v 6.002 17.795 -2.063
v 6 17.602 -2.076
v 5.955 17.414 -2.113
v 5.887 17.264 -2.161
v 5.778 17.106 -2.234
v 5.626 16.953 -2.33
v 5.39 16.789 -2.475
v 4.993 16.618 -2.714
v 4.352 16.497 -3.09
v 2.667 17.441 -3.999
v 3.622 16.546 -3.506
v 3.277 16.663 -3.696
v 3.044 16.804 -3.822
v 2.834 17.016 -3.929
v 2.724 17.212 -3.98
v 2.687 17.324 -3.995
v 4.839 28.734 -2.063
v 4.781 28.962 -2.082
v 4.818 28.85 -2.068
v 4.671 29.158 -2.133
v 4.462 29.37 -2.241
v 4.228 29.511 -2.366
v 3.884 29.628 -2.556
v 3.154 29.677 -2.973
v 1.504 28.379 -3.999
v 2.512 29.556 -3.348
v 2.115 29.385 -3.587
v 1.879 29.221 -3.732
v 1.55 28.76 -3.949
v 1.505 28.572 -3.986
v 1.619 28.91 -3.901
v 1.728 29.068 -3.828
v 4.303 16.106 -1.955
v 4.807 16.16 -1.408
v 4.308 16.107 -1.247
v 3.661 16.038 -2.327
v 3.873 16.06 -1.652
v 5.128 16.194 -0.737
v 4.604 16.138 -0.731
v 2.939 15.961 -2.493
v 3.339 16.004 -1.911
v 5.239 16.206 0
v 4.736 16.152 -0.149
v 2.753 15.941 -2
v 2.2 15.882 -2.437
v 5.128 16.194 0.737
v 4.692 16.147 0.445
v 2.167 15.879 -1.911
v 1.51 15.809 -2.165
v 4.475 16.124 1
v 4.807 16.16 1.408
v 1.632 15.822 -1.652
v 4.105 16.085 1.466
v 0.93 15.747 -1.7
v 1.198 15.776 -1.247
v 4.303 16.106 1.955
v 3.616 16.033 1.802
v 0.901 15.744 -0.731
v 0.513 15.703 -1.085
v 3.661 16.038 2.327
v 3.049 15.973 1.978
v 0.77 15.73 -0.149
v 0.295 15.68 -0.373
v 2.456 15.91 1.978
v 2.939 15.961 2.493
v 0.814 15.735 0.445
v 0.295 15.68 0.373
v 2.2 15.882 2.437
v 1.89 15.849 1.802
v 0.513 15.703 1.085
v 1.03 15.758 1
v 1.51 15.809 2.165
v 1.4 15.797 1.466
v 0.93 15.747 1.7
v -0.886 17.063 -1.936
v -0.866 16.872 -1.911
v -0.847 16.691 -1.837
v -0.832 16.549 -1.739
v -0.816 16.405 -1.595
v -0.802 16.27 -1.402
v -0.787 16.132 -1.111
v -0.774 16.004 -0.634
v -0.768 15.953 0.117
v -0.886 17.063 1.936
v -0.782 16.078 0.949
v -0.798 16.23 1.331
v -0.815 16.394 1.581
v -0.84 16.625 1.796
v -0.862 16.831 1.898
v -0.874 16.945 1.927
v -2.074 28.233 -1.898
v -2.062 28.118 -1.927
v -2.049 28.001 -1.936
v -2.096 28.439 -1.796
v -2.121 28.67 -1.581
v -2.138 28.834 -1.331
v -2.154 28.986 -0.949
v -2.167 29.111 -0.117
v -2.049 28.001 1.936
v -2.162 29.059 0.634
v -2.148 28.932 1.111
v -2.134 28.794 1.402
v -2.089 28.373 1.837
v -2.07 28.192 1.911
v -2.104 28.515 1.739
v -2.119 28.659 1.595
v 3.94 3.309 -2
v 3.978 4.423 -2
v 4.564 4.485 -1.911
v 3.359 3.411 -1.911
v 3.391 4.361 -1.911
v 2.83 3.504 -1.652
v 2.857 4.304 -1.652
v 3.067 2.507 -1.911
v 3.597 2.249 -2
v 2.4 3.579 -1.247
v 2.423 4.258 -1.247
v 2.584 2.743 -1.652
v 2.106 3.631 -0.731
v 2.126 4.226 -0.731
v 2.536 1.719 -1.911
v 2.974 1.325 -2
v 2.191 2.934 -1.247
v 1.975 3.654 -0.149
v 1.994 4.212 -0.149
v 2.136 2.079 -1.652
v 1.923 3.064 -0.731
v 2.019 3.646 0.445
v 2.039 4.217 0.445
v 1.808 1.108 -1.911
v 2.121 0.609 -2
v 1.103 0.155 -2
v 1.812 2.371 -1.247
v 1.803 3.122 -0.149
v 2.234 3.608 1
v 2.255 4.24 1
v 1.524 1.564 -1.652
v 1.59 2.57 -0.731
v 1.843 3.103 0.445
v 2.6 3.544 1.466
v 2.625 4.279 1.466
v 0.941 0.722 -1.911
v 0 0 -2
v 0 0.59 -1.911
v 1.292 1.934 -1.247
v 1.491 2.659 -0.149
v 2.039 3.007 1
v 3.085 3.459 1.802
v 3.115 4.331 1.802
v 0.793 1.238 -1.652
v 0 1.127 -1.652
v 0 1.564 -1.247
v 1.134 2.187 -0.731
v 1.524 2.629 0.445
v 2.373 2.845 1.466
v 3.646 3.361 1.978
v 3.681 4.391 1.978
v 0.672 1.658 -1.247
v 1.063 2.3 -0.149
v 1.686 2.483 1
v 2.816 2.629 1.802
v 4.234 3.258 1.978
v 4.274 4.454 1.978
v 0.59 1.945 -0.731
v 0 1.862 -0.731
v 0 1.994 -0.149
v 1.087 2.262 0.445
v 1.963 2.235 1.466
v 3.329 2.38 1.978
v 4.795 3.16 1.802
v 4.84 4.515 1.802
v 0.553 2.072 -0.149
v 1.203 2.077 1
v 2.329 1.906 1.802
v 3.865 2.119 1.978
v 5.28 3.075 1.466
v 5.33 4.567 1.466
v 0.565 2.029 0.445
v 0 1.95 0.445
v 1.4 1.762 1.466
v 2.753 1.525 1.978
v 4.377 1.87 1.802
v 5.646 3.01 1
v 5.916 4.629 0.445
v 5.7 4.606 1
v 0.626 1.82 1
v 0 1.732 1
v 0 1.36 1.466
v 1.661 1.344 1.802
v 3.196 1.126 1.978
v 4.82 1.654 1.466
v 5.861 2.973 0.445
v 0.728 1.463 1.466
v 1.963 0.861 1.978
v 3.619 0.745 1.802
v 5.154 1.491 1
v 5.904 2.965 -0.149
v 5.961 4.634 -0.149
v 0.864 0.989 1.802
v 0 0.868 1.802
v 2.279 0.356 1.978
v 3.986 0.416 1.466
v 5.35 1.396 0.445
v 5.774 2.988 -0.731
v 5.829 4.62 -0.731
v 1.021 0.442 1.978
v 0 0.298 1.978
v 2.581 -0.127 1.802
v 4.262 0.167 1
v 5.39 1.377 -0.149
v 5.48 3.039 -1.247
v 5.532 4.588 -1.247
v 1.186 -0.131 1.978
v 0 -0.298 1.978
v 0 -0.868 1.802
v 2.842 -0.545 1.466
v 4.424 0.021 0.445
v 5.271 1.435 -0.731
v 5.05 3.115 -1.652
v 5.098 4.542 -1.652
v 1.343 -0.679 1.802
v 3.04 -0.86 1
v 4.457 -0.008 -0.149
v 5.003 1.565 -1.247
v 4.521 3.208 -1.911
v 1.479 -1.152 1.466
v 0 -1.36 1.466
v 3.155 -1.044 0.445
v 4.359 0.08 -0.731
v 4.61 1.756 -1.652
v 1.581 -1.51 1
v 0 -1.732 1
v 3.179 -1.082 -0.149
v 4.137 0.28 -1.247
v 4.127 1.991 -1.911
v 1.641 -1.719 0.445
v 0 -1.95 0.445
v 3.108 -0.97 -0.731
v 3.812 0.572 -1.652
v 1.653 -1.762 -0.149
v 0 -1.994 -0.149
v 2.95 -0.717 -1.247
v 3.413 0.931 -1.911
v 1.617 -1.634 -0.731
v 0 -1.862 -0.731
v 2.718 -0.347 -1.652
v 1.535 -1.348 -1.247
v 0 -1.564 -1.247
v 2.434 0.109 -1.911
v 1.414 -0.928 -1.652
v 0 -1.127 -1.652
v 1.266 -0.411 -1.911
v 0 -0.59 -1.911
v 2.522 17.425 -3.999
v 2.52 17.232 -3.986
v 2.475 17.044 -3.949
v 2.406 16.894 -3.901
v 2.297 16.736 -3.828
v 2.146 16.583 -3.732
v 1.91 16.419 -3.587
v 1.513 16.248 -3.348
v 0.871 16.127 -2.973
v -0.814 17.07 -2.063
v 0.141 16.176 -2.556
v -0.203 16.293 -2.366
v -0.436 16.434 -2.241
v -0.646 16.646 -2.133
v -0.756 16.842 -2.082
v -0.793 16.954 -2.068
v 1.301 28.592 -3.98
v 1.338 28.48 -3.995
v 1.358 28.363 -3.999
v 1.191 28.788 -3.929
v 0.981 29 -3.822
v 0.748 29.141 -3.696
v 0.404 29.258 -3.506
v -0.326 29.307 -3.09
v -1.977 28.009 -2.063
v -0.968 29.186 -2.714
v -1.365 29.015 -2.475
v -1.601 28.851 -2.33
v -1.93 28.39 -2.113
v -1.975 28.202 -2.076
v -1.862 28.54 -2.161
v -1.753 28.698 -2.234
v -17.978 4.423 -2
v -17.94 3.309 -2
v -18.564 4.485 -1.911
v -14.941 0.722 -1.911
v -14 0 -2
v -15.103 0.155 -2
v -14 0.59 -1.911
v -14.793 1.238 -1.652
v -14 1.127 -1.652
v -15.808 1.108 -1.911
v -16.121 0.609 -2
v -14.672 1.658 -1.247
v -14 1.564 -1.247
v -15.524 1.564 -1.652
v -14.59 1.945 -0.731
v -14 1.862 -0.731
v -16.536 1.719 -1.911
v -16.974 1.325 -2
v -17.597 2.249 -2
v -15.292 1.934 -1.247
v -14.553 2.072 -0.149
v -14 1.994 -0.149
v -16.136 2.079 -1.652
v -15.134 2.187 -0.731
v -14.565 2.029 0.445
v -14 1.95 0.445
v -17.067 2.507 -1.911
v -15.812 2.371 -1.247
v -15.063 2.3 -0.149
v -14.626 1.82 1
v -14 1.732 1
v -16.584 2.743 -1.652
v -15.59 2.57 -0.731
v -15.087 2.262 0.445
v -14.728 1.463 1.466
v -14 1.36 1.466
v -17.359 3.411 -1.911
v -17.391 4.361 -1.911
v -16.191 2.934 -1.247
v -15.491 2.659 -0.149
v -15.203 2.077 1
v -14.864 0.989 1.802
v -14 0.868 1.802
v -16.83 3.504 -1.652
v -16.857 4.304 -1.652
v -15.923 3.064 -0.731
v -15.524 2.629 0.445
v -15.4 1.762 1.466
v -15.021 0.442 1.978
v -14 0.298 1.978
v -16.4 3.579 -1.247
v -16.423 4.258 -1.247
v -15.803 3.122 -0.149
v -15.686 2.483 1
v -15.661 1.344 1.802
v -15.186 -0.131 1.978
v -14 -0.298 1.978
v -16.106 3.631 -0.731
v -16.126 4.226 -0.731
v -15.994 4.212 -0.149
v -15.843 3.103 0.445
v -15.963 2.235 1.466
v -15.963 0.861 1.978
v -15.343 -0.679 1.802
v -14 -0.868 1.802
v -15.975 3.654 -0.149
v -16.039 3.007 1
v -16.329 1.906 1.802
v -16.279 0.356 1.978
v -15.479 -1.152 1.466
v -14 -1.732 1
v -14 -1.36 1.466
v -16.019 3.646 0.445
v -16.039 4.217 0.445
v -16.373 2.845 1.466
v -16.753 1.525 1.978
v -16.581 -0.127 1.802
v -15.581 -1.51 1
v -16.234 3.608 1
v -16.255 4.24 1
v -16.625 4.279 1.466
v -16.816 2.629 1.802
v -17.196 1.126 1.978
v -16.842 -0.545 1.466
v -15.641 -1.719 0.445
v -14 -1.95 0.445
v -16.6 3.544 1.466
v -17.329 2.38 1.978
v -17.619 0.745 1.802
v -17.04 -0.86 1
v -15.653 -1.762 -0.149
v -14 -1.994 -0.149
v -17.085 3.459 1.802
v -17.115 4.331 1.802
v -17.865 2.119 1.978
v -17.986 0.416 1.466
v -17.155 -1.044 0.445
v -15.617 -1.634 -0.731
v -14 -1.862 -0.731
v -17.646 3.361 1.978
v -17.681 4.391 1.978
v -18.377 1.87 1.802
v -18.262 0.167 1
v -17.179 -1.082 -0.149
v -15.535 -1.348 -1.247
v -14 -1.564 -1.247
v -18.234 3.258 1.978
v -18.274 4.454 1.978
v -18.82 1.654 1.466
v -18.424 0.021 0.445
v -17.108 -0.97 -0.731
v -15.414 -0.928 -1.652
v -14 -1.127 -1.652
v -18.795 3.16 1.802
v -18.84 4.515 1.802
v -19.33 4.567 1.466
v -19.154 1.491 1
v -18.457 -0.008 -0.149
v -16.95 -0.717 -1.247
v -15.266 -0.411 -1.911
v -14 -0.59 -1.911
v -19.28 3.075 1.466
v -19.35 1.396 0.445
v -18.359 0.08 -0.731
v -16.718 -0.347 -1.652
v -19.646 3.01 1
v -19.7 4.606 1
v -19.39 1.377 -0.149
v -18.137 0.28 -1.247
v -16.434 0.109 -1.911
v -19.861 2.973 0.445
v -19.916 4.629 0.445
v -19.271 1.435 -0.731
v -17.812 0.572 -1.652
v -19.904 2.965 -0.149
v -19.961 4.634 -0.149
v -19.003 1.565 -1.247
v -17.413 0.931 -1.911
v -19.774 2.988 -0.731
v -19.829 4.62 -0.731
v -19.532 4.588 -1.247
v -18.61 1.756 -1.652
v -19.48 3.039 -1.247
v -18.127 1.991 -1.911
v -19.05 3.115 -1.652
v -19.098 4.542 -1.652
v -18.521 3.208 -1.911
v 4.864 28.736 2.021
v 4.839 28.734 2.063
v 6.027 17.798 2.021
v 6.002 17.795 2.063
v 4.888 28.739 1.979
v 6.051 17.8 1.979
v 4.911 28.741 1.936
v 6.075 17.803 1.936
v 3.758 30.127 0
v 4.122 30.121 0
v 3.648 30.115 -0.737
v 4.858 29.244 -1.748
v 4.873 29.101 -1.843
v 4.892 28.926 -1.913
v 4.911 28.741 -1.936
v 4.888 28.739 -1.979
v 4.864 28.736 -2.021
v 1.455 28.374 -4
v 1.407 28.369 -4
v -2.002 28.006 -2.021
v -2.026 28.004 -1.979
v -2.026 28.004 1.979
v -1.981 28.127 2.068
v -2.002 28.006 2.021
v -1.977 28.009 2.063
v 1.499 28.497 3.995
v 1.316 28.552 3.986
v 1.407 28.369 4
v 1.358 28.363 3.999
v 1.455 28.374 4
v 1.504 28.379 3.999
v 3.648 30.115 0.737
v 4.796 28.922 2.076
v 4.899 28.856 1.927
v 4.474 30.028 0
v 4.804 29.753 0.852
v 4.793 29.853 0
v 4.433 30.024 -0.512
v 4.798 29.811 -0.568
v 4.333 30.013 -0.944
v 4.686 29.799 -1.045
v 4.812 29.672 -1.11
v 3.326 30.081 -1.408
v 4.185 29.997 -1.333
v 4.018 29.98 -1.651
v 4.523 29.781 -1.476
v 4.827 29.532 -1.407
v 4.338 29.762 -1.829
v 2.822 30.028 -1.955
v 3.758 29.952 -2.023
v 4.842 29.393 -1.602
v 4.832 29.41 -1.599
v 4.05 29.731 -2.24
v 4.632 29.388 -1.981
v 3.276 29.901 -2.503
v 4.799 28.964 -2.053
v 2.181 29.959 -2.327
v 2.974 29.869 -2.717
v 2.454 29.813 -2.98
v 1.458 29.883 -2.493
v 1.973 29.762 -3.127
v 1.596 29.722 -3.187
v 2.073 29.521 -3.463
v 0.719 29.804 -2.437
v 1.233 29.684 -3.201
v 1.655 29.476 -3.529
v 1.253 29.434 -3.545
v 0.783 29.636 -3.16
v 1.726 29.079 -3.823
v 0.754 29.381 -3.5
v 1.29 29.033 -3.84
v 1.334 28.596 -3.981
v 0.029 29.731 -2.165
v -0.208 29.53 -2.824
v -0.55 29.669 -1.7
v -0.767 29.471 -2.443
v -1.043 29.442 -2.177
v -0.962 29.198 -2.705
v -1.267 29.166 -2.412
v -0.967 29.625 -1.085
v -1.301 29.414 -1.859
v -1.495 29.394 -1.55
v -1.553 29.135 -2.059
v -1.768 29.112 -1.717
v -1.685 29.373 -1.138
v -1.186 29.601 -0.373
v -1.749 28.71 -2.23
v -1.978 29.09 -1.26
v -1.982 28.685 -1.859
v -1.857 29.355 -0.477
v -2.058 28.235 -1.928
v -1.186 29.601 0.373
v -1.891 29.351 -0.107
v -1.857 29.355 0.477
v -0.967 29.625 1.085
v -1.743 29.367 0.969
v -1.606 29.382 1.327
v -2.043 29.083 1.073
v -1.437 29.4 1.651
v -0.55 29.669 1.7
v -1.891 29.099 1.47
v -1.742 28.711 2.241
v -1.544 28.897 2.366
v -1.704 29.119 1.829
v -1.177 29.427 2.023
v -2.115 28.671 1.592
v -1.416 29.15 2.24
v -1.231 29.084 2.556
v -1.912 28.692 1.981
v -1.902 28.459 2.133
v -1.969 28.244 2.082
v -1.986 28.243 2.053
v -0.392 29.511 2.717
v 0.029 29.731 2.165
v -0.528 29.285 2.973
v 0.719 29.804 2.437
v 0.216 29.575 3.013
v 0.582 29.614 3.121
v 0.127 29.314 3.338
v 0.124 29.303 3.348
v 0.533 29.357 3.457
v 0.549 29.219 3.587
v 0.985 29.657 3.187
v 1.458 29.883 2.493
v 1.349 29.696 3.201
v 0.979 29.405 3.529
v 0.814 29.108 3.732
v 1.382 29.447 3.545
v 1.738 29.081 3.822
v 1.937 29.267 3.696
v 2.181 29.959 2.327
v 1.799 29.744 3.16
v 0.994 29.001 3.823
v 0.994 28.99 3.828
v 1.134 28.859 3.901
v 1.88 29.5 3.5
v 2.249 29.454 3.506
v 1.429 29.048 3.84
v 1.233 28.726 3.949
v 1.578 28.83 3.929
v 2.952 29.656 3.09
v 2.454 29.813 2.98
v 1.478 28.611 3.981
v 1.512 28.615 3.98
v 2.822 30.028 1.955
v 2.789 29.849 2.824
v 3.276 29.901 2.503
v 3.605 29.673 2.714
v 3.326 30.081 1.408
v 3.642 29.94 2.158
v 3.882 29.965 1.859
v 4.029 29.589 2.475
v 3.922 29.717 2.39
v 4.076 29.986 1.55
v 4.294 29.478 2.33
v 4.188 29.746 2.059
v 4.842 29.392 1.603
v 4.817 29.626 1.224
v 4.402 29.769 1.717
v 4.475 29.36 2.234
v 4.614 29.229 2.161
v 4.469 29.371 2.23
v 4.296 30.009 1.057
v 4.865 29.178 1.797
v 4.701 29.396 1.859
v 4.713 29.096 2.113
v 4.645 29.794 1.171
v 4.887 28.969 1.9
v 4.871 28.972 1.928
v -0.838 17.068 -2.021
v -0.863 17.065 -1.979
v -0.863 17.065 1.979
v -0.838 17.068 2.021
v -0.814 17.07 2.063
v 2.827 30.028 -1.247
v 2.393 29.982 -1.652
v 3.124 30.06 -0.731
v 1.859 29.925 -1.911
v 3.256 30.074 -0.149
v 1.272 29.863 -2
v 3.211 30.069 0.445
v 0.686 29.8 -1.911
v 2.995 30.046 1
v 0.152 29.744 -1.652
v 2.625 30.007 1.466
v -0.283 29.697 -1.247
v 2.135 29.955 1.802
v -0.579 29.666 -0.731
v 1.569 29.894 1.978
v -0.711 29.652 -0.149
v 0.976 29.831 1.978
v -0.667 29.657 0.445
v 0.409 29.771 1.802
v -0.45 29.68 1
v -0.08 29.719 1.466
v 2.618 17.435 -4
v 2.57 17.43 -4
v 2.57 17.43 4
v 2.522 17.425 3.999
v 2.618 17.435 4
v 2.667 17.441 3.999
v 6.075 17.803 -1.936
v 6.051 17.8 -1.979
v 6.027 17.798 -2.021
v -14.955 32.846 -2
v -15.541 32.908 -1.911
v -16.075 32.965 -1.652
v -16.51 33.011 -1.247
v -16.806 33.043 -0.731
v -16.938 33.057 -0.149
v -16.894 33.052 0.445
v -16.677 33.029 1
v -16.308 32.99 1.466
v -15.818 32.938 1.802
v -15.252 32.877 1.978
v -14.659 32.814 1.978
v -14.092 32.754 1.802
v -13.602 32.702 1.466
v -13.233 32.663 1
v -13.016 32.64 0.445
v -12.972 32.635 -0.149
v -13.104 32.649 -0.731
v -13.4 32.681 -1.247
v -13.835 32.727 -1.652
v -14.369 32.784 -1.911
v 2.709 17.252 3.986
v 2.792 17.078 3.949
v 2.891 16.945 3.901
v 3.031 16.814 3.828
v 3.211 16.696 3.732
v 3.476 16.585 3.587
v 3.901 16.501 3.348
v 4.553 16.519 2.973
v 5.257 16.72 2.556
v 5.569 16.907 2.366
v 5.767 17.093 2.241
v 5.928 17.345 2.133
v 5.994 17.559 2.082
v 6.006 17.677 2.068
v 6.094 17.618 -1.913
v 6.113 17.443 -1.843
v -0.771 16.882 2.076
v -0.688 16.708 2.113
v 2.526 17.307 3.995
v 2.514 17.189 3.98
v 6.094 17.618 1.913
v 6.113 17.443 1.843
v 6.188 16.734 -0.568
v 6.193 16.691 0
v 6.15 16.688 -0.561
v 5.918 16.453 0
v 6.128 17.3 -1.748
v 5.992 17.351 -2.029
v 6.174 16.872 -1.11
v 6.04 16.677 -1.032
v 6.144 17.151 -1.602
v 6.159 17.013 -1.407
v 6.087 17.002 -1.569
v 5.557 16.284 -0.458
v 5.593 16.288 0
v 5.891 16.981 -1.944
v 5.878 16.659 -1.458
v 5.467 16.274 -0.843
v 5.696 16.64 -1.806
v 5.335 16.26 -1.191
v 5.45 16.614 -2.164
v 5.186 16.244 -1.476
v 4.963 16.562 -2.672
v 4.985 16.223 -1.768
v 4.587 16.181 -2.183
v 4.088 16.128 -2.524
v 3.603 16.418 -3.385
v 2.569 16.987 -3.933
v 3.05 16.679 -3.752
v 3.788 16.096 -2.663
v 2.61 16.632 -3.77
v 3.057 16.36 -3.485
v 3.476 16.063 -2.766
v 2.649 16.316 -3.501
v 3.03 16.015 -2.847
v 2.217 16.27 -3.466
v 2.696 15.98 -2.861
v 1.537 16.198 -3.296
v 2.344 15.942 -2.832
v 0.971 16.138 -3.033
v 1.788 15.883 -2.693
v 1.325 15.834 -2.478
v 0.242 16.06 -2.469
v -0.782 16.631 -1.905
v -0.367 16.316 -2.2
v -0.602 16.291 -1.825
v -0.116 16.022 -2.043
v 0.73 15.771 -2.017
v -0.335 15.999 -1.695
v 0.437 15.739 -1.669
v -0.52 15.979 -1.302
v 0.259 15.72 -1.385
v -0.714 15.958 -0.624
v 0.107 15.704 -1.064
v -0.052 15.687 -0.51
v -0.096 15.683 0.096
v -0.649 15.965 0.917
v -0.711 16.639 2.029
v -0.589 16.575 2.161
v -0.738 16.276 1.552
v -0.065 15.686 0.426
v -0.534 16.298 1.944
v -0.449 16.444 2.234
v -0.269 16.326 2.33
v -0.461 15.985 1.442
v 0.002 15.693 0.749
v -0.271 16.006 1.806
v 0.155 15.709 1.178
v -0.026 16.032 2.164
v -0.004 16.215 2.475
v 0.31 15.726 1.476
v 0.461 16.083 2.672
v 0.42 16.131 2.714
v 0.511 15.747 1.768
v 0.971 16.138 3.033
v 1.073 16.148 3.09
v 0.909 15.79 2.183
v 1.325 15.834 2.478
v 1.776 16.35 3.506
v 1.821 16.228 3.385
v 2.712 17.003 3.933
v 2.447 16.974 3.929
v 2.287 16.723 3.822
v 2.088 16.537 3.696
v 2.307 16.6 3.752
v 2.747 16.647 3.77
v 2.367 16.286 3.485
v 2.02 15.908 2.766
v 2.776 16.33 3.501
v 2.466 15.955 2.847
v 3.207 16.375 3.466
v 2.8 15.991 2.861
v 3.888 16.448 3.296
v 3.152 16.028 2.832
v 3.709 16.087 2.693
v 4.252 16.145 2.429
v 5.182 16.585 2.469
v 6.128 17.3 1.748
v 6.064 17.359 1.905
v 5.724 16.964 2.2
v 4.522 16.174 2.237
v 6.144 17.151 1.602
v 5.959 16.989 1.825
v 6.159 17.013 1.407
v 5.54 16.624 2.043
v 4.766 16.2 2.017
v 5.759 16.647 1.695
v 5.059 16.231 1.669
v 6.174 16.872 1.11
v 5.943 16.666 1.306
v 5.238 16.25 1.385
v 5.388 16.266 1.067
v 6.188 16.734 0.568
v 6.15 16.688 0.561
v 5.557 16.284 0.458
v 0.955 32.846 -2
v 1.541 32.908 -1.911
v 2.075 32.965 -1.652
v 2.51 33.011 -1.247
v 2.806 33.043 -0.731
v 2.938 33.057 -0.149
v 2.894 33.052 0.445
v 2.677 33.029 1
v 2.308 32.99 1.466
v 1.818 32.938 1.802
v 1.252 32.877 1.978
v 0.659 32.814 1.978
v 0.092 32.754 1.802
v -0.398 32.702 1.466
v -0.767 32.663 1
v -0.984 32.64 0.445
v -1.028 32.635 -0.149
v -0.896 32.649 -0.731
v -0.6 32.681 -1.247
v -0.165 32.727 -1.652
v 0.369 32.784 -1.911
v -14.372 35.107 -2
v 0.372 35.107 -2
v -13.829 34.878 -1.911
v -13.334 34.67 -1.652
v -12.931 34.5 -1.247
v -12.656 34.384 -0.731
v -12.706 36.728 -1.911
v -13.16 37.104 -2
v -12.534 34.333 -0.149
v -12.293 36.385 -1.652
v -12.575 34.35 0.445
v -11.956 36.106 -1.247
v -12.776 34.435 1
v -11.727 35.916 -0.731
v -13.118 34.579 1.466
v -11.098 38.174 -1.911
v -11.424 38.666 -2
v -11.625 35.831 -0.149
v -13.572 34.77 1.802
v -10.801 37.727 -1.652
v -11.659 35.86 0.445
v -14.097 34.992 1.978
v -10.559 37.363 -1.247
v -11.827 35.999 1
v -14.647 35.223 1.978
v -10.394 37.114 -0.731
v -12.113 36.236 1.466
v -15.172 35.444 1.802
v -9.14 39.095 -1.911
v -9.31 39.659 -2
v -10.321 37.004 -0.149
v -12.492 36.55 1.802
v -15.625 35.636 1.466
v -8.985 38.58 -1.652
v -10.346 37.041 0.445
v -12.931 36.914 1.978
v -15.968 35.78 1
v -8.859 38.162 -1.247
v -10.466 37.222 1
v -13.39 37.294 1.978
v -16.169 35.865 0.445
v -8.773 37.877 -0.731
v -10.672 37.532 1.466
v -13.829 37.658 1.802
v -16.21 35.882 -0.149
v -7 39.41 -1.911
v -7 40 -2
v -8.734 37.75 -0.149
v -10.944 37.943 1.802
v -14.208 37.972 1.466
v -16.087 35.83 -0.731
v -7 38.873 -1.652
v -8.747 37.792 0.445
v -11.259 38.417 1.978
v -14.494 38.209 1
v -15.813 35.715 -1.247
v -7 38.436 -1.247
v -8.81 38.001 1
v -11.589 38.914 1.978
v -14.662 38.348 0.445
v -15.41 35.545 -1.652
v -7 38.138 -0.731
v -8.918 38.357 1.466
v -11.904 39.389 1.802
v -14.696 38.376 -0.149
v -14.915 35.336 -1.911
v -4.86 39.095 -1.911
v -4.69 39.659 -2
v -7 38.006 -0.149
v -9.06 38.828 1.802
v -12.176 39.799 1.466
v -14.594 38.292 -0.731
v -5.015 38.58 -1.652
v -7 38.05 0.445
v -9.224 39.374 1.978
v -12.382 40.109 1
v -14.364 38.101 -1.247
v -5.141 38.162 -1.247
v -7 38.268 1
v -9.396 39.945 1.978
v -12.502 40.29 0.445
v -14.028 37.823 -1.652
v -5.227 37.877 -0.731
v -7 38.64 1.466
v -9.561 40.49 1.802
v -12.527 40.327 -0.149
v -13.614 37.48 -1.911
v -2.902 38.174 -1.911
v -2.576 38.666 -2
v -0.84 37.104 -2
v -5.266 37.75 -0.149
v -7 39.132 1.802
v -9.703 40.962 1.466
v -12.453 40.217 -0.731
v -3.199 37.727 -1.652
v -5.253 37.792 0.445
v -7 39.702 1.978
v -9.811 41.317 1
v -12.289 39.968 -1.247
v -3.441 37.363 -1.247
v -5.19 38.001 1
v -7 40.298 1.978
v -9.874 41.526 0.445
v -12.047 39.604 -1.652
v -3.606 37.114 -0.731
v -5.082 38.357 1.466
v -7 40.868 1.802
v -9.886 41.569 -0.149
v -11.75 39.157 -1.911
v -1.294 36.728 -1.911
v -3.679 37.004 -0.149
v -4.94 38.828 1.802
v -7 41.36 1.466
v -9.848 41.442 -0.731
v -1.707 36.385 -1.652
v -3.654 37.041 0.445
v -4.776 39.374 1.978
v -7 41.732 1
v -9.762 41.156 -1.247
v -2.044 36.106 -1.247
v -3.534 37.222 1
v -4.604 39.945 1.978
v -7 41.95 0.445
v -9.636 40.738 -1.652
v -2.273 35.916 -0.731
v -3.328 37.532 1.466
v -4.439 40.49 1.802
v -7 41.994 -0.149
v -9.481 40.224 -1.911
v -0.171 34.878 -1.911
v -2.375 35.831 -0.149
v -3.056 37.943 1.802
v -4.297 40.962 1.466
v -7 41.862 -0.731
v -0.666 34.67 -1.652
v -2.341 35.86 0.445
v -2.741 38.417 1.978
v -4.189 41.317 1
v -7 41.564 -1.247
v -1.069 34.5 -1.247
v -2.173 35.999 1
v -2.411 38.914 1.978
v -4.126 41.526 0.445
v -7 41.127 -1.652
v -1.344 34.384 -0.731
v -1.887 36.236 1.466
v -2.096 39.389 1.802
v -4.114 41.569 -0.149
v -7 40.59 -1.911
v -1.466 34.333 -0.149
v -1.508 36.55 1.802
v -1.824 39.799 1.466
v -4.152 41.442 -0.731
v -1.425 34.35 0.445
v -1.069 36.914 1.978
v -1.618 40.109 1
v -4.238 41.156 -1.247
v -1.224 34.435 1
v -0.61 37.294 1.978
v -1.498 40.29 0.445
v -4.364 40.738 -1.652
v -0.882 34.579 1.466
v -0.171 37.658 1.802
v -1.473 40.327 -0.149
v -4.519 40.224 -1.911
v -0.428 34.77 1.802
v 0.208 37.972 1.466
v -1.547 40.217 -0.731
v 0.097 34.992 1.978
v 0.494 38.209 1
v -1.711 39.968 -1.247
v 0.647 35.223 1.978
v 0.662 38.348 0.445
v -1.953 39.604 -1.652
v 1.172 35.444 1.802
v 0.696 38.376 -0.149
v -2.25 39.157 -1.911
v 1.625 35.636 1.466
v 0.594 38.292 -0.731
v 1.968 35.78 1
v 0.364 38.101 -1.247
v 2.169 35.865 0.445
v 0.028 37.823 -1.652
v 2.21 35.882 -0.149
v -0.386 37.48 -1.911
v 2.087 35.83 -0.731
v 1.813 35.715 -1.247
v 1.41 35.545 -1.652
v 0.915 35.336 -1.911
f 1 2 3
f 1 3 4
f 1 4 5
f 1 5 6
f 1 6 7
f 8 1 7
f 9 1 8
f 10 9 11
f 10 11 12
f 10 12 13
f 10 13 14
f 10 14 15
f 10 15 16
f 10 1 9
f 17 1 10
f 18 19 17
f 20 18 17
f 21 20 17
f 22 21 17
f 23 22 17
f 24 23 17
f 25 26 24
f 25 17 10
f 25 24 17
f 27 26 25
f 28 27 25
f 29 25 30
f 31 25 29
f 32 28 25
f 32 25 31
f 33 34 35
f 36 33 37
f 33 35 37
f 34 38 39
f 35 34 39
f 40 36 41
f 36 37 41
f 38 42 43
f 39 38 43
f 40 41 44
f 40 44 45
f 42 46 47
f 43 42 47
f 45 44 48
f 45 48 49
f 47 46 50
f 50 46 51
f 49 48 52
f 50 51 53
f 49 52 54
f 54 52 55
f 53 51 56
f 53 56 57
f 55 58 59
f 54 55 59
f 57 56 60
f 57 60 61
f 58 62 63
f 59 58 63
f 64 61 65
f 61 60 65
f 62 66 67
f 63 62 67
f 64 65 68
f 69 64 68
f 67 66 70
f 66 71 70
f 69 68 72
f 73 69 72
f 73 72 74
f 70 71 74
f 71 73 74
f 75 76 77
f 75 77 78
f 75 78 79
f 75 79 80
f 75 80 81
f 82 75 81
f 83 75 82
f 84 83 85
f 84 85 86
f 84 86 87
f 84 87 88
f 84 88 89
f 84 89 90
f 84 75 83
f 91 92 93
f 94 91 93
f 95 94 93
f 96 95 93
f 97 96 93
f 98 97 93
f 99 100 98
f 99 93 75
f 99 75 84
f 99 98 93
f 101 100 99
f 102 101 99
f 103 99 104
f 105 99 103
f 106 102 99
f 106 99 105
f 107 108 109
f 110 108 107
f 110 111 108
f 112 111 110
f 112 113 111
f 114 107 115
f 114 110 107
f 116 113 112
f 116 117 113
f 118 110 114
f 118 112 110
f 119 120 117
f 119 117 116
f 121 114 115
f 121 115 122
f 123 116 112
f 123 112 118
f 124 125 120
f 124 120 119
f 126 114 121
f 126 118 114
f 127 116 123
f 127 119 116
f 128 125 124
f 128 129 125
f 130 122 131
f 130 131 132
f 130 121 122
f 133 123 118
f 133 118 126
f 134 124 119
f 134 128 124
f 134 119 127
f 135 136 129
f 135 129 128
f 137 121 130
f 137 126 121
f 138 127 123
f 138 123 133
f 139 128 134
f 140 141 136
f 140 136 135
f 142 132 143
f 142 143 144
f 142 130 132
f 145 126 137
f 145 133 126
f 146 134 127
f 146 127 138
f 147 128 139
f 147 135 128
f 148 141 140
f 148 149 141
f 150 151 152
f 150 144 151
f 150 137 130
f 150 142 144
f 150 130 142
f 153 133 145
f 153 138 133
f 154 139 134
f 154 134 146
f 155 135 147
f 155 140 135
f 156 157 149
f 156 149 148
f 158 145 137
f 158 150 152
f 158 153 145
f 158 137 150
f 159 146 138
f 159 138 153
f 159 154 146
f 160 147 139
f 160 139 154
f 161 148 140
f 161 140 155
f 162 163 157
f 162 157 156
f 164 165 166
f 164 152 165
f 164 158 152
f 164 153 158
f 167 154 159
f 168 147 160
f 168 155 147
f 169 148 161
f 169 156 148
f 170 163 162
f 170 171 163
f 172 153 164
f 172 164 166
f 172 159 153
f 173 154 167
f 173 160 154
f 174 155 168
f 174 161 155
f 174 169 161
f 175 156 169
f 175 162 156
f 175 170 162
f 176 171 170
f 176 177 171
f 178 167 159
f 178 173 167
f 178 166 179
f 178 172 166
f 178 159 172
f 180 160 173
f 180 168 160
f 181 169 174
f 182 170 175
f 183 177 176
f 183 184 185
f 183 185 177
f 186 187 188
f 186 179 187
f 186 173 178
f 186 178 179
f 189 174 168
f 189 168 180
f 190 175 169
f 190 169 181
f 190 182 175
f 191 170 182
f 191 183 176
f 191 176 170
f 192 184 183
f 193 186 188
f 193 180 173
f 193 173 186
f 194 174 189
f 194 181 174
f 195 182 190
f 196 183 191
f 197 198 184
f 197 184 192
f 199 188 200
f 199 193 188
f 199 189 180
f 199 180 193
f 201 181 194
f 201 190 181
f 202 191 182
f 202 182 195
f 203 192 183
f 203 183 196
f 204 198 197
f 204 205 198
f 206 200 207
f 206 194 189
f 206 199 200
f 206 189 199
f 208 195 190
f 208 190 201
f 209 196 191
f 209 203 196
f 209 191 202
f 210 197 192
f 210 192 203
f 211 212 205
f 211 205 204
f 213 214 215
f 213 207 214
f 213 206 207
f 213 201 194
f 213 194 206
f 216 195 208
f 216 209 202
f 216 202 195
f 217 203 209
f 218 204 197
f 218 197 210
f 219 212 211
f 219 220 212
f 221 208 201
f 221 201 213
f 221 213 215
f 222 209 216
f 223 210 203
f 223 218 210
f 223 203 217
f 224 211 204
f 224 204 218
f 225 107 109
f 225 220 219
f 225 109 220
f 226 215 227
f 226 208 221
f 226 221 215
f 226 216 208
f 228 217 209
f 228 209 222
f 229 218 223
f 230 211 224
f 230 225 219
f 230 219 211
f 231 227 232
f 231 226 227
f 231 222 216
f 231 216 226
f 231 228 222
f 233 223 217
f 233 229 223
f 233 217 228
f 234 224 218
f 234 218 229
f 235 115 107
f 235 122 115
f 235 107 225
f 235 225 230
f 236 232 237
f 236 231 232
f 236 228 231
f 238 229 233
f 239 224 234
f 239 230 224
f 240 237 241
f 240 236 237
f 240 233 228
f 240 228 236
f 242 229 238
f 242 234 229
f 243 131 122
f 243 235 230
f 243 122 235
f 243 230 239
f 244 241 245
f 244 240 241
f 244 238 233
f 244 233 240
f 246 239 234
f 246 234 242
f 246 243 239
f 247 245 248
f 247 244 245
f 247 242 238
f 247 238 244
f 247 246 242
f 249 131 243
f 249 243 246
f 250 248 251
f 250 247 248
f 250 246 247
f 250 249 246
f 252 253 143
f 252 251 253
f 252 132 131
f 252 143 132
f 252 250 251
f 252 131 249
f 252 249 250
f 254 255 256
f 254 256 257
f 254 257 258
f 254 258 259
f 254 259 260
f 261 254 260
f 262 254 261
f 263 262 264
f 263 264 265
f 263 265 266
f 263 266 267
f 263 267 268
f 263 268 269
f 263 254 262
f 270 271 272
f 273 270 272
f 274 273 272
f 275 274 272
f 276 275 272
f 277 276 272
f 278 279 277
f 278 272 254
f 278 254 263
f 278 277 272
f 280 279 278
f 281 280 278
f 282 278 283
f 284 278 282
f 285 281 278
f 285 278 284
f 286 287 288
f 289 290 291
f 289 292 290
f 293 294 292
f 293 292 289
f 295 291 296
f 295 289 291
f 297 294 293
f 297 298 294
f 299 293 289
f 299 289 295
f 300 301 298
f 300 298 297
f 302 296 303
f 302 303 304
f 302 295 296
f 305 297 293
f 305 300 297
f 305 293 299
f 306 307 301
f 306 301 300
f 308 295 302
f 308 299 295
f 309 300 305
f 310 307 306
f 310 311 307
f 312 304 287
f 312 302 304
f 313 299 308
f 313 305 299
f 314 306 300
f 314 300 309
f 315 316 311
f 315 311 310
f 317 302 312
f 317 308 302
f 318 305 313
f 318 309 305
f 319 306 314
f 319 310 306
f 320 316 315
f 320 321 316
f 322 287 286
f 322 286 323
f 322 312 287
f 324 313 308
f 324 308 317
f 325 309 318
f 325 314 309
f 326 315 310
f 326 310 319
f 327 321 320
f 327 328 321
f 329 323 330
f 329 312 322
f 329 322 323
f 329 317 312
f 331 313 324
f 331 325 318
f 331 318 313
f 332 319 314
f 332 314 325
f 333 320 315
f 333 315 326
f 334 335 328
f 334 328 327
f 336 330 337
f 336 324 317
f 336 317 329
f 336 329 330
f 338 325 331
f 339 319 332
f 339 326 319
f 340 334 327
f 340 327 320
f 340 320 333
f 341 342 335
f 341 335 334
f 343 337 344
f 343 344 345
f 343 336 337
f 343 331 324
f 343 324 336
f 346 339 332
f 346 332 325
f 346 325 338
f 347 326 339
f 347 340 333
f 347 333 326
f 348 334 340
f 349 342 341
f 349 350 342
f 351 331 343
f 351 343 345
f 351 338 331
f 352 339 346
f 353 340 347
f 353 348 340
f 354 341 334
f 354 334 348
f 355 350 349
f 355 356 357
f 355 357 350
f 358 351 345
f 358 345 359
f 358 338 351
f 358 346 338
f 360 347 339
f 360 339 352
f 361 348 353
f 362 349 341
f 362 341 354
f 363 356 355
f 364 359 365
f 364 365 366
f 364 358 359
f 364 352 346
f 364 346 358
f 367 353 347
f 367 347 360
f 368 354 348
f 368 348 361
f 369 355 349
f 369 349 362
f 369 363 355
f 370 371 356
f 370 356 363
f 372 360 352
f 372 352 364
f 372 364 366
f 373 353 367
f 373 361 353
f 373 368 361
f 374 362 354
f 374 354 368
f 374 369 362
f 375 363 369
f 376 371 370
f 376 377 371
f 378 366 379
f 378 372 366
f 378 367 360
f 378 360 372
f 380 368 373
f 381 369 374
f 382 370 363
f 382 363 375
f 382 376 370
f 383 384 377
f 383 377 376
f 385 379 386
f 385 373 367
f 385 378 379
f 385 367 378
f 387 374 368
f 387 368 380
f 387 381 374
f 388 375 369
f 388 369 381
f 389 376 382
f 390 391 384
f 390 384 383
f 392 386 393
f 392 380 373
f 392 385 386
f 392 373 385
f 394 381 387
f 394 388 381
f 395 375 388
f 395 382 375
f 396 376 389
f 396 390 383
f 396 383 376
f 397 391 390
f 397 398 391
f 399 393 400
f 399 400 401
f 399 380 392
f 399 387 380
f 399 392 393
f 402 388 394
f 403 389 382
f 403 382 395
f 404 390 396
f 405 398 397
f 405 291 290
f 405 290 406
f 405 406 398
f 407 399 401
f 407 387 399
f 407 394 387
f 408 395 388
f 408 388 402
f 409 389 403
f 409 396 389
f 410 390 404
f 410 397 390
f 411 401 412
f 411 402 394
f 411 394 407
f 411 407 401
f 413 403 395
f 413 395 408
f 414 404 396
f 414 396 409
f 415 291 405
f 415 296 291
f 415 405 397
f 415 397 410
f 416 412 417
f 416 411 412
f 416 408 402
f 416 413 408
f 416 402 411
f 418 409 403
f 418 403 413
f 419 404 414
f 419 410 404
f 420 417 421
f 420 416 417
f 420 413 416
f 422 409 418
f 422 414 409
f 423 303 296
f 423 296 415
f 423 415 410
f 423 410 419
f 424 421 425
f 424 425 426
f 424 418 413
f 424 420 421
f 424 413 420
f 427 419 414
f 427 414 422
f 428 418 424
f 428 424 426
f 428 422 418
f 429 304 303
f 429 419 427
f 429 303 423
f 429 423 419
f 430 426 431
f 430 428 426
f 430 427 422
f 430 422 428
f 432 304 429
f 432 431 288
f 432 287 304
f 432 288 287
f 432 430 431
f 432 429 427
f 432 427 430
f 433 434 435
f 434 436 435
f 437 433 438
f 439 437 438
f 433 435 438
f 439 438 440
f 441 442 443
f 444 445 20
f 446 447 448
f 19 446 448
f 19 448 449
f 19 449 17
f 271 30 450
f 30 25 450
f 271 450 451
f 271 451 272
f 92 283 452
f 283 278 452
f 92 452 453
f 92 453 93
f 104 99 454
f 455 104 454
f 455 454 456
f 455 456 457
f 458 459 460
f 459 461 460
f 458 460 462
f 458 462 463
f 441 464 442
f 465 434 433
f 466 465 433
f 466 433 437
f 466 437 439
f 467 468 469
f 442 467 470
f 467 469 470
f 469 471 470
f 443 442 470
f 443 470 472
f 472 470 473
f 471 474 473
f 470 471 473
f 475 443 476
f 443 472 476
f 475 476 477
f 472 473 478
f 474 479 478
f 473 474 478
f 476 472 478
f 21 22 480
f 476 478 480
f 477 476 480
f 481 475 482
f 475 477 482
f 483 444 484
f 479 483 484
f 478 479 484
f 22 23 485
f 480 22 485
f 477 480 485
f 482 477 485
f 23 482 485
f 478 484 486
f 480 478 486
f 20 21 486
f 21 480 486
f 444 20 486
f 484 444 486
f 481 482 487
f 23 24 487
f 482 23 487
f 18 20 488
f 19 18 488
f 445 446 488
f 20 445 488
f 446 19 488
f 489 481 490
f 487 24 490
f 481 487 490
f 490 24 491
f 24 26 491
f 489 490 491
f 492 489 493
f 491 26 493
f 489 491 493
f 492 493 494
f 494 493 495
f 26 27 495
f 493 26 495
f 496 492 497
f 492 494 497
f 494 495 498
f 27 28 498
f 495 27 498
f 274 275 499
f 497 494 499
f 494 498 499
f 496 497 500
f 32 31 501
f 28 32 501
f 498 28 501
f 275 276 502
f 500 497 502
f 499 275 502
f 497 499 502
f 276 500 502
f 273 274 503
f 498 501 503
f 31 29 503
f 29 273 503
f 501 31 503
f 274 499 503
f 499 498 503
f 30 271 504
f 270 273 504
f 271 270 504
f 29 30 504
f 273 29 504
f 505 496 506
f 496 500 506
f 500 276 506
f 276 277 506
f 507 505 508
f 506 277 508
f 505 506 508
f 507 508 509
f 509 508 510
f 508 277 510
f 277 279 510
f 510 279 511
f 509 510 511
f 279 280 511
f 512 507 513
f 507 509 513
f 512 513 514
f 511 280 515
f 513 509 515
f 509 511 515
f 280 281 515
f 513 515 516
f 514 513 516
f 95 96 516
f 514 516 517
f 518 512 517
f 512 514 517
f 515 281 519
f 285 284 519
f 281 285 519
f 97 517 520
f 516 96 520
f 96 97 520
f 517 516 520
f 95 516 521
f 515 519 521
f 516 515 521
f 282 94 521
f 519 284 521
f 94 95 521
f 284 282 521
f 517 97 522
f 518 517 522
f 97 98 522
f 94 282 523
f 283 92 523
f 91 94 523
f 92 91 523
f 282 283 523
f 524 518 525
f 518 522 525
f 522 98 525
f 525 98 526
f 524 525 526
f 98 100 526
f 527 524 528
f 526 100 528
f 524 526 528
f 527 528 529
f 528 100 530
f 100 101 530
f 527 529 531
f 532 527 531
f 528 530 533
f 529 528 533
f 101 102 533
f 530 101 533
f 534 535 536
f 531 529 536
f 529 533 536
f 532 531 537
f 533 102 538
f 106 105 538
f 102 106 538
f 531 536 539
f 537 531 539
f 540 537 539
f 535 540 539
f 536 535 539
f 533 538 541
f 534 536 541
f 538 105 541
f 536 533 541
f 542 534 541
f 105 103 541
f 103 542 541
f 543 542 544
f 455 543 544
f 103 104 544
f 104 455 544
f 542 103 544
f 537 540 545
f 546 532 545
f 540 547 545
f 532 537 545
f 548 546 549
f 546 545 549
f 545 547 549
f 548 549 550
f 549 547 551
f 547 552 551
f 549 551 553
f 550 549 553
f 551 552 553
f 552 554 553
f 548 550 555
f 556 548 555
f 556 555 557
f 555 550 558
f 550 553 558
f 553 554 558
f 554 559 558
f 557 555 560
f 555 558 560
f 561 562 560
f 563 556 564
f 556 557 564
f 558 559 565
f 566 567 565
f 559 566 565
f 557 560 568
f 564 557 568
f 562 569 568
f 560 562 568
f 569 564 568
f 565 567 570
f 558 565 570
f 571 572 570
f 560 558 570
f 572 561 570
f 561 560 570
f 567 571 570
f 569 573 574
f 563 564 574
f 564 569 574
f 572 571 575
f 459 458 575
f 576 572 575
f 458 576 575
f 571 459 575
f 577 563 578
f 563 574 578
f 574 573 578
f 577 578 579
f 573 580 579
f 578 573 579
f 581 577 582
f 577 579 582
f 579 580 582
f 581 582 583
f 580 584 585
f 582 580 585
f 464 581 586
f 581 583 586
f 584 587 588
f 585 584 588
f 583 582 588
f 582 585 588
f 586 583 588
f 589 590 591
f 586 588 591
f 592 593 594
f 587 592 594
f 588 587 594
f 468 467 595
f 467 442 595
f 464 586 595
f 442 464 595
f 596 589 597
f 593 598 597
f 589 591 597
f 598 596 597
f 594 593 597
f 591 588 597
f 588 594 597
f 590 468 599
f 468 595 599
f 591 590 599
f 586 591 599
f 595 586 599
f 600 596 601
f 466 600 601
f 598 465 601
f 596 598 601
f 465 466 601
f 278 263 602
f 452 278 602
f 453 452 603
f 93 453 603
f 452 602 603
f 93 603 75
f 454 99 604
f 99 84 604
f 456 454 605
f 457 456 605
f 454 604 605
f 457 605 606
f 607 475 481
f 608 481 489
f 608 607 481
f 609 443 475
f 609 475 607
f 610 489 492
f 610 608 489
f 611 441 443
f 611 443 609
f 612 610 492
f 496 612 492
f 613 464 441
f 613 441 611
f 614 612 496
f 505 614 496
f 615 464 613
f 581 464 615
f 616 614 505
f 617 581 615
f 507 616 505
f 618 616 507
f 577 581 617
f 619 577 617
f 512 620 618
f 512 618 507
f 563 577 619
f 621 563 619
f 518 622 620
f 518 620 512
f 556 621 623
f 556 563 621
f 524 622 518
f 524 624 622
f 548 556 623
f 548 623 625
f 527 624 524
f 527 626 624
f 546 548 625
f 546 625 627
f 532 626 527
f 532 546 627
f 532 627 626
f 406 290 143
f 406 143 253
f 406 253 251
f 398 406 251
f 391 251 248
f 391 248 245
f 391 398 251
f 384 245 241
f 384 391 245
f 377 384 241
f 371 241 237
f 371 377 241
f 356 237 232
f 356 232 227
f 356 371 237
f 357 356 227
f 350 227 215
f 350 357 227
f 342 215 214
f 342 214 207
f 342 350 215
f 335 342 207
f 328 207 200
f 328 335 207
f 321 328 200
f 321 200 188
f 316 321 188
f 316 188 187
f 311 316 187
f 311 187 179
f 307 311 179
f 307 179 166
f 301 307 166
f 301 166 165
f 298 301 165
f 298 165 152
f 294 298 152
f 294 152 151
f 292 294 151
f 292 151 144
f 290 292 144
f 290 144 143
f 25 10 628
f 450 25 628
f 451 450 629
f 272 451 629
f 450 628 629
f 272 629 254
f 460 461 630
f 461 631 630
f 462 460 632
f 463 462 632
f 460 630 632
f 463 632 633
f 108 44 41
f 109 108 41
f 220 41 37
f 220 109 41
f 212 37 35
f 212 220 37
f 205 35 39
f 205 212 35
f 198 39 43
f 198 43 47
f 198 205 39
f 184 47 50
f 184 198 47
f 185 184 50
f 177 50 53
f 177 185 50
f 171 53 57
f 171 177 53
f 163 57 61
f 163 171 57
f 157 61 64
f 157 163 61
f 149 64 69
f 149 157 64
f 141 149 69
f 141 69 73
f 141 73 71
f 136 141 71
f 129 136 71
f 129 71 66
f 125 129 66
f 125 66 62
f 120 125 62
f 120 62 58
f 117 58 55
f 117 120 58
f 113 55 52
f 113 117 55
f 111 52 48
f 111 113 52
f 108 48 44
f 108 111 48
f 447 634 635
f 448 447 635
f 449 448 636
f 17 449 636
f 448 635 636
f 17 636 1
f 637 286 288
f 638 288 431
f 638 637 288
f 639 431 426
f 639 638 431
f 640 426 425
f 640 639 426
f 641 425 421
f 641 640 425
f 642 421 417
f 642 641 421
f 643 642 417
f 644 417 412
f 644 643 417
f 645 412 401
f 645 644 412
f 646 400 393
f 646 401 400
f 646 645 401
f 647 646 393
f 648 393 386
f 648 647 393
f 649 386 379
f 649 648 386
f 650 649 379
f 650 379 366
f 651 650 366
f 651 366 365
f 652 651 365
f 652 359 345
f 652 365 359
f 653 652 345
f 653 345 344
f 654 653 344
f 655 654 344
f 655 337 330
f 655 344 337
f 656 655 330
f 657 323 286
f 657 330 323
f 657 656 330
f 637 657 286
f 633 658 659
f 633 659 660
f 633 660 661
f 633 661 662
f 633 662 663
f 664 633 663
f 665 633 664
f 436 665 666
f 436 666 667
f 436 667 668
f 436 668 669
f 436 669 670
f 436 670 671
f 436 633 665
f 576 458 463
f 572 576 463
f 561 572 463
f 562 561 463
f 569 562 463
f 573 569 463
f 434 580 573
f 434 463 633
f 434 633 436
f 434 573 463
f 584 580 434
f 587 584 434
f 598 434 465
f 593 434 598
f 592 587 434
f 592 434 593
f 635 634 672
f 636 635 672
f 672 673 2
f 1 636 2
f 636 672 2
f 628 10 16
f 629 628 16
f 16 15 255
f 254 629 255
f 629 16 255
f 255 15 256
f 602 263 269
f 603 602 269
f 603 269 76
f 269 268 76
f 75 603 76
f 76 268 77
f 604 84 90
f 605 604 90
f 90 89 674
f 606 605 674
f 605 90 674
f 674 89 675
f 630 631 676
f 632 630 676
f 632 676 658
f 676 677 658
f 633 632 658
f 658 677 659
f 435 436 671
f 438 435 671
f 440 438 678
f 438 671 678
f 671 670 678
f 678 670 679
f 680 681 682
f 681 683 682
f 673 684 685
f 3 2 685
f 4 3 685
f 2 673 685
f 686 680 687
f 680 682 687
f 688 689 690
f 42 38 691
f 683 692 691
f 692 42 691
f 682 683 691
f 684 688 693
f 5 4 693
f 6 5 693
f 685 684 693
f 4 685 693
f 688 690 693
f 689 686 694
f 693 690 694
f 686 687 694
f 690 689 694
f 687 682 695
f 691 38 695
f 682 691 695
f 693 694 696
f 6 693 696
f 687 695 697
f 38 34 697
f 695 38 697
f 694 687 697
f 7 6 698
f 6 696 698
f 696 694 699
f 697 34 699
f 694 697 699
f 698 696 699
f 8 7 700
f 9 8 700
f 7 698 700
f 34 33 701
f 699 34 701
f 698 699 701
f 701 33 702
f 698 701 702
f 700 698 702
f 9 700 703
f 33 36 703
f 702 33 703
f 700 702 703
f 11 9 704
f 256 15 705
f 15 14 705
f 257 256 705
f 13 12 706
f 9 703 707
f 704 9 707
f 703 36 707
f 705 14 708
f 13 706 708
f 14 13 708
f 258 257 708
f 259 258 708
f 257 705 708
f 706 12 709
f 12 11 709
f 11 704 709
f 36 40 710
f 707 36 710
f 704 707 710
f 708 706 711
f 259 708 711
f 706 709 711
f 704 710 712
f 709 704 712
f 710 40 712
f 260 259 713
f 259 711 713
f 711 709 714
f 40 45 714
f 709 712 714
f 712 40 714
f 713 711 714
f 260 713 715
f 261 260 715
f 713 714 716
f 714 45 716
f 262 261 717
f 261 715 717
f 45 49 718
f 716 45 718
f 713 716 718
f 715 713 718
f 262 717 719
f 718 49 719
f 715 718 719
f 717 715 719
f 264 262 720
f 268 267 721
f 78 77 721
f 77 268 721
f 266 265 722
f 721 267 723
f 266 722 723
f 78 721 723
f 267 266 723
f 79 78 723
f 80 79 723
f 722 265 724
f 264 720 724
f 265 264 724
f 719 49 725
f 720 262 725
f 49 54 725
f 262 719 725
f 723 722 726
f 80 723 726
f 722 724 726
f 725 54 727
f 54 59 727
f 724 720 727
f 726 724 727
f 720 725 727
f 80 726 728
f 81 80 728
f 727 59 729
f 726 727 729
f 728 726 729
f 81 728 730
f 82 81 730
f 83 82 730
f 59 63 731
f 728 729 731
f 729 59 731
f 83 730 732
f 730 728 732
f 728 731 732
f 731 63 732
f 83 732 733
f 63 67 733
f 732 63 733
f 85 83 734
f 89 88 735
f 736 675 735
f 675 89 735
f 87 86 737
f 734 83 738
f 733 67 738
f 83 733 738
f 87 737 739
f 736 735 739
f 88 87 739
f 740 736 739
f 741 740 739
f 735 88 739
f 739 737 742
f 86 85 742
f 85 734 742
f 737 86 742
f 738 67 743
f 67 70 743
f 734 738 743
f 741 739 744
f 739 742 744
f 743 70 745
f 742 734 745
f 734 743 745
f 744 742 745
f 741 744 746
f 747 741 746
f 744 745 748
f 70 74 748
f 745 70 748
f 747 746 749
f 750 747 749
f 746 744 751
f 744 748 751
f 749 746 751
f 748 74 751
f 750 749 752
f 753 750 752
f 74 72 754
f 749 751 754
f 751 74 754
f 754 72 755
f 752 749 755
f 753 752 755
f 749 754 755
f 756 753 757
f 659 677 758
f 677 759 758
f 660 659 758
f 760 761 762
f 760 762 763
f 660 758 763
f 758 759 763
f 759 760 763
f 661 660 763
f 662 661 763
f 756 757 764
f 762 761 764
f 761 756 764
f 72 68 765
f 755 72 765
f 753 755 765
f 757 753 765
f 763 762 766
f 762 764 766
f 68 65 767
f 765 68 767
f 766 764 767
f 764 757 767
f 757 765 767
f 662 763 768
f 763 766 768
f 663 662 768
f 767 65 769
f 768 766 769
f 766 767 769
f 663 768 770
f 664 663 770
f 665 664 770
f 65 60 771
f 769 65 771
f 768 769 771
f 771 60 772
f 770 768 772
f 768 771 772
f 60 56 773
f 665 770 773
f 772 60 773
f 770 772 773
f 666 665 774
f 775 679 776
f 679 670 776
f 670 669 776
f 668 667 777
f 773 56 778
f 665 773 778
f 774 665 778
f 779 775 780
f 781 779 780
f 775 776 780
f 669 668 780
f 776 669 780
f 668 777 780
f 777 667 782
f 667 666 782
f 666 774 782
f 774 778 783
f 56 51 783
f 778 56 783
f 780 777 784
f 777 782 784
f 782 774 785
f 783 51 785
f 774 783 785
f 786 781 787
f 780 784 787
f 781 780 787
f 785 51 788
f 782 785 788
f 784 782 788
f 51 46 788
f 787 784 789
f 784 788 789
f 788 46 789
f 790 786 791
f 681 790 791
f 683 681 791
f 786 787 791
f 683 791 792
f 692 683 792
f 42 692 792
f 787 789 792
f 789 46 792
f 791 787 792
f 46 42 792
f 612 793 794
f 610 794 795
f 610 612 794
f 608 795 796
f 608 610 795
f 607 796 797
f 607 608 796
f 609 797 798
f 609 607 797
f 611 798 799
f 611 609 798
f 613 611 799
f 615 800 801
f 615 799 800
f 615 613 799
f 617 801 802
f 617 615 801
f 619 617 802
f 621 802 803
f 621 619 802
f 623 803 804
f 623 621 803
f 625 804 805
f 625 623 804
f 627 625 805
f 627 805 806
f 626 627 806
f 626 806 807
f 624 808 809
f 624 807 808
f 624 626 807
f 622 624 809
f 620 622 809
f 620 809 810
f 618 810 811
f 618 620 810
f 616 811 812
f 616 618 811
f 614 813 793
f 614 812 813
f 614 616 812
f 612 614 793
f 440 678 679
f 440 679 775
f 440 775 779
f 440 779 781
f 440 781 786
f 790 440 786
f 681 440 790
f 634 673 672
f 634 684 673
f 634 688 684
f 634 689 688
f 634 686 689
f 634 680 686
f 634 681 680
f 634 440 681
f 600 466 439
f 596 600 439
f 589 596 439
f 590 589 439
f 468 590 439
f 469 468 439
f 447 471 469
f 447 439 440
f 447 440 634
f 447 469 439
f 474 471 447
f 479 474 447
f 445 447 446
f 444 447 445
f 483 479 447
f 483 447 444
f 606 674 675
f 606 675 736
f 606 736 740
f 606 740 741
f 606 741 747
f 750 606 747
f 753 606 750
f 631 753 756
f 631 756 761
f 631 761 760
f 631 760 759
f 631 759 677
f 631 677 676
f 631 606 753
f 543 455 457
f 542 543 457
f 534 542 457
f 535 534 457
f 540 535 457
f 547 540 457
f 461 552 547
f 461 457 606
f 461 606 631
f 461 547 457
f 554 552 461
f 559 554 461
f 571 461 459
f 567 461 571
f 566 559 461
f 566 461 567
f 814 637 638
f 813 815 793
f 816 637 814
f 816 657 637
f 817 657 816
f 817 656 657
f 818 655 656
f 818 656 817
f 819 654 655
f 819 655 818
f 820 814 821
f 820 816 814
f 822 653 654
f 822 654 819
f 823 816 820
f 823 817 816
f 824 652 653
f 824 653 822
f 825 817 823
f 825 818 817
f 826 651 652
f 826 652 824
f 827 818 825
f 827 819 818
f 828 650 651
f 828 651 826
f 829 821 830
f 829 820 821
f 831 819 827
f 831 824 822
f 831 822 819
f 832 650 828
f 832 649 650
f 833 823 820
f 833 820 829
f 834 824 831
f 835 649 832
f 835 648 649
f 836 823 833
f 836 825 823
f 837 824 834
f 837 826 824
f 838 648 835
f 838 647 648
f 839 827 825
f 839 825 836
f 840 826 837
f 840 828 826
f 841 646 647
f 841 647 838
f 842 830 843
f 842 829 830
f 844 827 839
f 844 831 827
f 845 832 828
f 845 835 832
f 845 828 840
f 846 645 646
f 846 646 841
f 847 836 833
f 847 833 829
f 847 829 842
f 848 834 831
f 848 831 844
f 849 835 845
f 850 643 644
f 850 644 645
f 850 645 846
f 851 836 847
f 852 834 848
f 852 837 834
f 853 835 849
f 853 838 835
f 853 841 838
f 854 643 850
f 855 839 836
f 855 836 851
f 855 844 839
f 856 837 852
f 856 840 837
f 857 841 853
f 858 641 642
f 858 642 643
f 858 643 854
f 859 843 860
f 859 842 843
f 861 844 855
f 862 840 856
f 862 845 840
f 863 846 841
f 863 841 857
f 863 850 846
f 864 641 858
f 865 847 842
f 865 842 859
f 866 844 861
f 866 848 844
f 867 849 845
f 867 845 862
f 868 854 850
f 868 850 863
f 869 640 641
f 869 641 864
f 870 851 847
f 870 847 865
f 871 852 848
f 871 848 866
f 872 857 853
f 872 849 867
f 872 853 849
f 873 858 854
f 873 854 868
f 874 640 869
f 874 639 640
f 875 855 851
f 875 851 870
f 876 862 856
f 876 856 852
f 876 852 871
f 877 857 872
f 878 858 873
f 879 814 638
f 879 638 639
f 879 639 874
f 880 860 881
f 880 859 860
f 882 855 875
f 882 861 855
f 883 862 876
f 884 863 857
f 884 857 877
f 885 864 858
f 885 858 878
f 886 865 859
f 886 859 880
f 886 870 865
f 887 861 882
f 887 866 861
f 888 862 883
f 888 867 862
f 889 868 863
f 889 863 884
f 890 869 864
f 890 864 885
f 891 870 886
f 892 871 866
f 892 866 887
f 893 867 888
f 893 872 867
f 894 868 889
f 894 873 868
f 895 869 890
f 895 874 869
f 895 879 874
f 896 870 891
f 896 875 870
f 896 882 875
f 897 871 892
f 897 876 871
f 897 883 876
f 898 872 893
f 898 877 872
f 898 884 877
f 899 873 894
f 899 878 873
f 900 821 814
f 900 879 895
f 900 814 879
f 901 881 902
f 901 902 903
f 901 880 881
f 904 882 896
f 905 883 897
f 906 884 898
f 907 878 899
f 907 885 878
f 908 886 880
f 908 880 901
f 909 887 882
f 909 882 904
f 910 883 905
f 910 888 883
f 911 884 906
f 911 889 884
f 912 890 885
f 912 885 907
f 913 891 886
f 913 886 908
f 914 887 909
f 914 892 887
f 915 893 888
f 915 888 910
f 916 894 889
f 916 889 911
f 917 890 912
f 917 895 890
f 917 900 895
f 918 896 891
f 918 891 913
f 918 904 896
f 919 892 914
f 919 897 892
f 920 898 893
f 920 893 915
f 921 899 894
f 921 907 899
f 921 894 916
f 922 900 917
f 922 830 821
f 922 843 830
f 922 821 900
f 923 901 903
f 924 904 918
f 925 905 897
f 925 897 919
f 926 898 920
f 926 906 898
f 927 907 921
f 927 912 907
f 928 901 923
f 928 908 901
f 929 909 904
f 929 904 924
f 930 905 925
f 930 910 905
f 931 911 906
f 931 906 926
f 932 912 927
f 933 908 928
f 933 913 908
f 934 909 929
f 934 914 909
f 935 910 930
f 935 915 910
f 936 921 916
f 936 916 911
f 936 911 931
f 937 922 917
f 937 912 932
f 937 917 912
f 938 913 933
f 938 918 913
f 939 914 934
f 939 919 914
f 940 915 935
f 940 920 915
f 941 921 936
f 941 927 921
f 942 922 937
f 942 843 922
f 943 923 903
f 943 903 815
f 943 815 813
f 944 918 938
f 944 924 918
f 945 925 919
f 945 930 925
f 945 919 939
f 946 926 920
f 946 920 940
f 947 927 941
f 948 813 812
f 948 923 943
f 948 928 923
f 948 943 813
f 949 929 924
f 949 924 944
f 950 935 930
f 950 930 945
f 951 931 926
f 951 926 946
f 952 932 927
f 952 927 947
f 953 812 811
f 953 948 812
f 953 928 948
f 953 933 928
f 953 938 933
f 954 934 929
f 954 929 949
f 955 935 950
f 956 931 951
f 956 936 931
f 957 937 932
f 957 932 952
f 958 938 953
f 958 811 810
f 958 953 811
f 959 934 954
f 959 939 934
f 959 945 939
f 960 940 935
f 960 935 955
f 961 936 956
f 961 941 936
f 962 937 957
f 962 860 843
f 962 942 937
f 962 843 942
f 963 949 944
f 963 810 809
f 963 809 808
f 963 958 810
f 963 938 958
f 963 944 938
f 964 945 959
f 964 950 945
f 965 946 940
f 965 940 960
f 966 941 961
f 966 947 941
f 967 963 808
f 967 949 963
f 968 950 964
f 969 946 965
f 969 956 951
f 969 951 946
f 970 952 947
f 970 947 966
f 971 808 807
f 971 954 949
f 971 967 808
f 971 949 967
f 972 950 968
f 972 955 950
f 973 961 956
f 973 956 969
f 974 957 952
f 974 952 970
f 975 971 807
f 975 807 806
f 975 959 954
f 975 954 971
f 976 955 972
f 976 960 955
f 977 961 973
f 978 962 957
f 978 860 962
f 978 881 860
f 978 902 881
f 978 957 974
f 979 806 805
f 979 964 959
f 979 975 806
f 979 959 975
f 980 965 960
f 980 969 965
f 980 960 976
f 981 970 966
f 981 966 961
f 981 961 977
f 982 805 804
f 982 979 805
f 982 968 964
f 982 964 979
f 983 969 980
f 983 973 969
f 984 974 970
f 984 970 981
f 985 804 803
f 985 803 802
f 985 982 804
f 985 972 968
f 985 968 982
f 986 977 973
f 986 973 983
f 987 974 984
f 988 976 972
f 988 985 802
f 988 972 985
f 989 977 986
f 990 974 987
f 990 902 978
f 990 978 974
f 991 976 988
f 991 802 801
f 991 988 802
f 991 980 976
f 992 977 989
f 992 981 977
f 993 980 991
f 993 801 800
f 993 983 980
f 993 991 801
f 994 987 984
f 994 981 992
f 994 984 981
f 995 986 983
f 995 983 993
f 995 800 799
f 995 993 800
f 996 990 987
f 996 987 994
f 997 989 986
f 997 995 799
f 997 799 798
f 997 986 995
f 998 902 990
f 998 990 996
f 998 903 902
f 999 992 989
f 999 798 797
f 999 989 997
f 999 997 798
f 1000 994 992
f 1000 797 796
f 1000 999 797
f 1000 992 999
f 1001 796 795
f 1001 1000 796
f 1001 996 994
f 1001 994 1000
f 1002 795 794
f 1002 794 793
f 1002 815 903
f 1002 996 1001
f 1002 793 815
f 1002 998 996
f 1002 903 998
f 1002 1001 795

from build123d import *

# Parameters (mm, degrees)
SKETCH1_R           = 2
BOSS_EXTRUDE1_START = -3
BOSS_EXTRUDE1_DEPTH = 14


with BuildPart() as part:
    # Sweep1: sweep along a path in Sketch2
    with BuildLine(Plane.XY) as sweep1_path:
        Line((0, 0), (-14, 0))
        ThreePointArc((-14, 0), (-16.974210855, 1.325290709), (-17.977574703, 4.422965104))
        Line((-17.977574703, 4.422965104), (-14.955149407, 32.845930209))
        ThreePointArc((-14.955149407, 32.845930209), (-7, 40), (0.955149407, 32.845930209))
        Line((0.955149407, 32.845930209), (3.977574703, 4.422965104))
        ThreePointArc((3.977574703, 4.422965104), (2.974210855, 1.325290709), (0, 0))
    # Sketch1 → Sweep1 (sweep)
    with BuildSketch(Plane(origin=(0, 0, 0), x_dir=(0, 0, -1), z_dir=(1, 0, 0))):
        Circle(SKETCH1_R)
    sweep(path=sweep1_path.line)

    # Sketch3 → Boss-Extrude1 (add)
    with BuildSketch(Plane(origin=(0.955149407, 32.845930209, 0), x_dir=(-0.9943936758290052, -0.10574127610010836, 0), z_dir=(-0.10574127610010836, 0.9943936758290052, 0)).offset(BOSS_EXTRUDE1_START)):
        Polygon((-3.5, 2.020725942), (-3.5, -2.020725942), (0, -4.041451884), (3.5, -2.020725942), (3.5, 2.020725942), (0, 4.041451884), align=None)
    extrude(amount=-BOSS_EXTRUDE1_DEPTH)

    # Sketch4 → Cut-Revolve1 (revolve, cut)
    with BuildSketch(Plane.XY):
        with BuildLine():
            Line((5.408559852, 28.794123772), (6.571713889, 17.855793338))
            ThreePointArc((6.571713889, 17.855793338), (6.246992703, 16.754623217), (5.23873529, 16.20559091))
            Line((5.23873529, 16.20559091), (5.408559852, 15.997851403))
            Line((5.408559852, 15.997851403), (9.687431561, 16.483117418))
            Line((9.687431561, 16.483117418), (7.699236532, 34.014185327))
            Line((7.699236532, 34.014185327), (3.310720243, 33.417080039))
            Line((3.310720243, 33.417080039), (3.758357425, 30.127102372))
            ThreePointArc((3.758357425, 30.127102372), (4.859527546, 29.802381185), (5.408559852, 28.794123772))
        make_face()
    revolve(axis=Axis((3.977574703, 4.422965104, 0), (-0.10574127610010838, 0.9943936758290052, 0)), mode=Mode.SUBTRACT)


solid = part.part
